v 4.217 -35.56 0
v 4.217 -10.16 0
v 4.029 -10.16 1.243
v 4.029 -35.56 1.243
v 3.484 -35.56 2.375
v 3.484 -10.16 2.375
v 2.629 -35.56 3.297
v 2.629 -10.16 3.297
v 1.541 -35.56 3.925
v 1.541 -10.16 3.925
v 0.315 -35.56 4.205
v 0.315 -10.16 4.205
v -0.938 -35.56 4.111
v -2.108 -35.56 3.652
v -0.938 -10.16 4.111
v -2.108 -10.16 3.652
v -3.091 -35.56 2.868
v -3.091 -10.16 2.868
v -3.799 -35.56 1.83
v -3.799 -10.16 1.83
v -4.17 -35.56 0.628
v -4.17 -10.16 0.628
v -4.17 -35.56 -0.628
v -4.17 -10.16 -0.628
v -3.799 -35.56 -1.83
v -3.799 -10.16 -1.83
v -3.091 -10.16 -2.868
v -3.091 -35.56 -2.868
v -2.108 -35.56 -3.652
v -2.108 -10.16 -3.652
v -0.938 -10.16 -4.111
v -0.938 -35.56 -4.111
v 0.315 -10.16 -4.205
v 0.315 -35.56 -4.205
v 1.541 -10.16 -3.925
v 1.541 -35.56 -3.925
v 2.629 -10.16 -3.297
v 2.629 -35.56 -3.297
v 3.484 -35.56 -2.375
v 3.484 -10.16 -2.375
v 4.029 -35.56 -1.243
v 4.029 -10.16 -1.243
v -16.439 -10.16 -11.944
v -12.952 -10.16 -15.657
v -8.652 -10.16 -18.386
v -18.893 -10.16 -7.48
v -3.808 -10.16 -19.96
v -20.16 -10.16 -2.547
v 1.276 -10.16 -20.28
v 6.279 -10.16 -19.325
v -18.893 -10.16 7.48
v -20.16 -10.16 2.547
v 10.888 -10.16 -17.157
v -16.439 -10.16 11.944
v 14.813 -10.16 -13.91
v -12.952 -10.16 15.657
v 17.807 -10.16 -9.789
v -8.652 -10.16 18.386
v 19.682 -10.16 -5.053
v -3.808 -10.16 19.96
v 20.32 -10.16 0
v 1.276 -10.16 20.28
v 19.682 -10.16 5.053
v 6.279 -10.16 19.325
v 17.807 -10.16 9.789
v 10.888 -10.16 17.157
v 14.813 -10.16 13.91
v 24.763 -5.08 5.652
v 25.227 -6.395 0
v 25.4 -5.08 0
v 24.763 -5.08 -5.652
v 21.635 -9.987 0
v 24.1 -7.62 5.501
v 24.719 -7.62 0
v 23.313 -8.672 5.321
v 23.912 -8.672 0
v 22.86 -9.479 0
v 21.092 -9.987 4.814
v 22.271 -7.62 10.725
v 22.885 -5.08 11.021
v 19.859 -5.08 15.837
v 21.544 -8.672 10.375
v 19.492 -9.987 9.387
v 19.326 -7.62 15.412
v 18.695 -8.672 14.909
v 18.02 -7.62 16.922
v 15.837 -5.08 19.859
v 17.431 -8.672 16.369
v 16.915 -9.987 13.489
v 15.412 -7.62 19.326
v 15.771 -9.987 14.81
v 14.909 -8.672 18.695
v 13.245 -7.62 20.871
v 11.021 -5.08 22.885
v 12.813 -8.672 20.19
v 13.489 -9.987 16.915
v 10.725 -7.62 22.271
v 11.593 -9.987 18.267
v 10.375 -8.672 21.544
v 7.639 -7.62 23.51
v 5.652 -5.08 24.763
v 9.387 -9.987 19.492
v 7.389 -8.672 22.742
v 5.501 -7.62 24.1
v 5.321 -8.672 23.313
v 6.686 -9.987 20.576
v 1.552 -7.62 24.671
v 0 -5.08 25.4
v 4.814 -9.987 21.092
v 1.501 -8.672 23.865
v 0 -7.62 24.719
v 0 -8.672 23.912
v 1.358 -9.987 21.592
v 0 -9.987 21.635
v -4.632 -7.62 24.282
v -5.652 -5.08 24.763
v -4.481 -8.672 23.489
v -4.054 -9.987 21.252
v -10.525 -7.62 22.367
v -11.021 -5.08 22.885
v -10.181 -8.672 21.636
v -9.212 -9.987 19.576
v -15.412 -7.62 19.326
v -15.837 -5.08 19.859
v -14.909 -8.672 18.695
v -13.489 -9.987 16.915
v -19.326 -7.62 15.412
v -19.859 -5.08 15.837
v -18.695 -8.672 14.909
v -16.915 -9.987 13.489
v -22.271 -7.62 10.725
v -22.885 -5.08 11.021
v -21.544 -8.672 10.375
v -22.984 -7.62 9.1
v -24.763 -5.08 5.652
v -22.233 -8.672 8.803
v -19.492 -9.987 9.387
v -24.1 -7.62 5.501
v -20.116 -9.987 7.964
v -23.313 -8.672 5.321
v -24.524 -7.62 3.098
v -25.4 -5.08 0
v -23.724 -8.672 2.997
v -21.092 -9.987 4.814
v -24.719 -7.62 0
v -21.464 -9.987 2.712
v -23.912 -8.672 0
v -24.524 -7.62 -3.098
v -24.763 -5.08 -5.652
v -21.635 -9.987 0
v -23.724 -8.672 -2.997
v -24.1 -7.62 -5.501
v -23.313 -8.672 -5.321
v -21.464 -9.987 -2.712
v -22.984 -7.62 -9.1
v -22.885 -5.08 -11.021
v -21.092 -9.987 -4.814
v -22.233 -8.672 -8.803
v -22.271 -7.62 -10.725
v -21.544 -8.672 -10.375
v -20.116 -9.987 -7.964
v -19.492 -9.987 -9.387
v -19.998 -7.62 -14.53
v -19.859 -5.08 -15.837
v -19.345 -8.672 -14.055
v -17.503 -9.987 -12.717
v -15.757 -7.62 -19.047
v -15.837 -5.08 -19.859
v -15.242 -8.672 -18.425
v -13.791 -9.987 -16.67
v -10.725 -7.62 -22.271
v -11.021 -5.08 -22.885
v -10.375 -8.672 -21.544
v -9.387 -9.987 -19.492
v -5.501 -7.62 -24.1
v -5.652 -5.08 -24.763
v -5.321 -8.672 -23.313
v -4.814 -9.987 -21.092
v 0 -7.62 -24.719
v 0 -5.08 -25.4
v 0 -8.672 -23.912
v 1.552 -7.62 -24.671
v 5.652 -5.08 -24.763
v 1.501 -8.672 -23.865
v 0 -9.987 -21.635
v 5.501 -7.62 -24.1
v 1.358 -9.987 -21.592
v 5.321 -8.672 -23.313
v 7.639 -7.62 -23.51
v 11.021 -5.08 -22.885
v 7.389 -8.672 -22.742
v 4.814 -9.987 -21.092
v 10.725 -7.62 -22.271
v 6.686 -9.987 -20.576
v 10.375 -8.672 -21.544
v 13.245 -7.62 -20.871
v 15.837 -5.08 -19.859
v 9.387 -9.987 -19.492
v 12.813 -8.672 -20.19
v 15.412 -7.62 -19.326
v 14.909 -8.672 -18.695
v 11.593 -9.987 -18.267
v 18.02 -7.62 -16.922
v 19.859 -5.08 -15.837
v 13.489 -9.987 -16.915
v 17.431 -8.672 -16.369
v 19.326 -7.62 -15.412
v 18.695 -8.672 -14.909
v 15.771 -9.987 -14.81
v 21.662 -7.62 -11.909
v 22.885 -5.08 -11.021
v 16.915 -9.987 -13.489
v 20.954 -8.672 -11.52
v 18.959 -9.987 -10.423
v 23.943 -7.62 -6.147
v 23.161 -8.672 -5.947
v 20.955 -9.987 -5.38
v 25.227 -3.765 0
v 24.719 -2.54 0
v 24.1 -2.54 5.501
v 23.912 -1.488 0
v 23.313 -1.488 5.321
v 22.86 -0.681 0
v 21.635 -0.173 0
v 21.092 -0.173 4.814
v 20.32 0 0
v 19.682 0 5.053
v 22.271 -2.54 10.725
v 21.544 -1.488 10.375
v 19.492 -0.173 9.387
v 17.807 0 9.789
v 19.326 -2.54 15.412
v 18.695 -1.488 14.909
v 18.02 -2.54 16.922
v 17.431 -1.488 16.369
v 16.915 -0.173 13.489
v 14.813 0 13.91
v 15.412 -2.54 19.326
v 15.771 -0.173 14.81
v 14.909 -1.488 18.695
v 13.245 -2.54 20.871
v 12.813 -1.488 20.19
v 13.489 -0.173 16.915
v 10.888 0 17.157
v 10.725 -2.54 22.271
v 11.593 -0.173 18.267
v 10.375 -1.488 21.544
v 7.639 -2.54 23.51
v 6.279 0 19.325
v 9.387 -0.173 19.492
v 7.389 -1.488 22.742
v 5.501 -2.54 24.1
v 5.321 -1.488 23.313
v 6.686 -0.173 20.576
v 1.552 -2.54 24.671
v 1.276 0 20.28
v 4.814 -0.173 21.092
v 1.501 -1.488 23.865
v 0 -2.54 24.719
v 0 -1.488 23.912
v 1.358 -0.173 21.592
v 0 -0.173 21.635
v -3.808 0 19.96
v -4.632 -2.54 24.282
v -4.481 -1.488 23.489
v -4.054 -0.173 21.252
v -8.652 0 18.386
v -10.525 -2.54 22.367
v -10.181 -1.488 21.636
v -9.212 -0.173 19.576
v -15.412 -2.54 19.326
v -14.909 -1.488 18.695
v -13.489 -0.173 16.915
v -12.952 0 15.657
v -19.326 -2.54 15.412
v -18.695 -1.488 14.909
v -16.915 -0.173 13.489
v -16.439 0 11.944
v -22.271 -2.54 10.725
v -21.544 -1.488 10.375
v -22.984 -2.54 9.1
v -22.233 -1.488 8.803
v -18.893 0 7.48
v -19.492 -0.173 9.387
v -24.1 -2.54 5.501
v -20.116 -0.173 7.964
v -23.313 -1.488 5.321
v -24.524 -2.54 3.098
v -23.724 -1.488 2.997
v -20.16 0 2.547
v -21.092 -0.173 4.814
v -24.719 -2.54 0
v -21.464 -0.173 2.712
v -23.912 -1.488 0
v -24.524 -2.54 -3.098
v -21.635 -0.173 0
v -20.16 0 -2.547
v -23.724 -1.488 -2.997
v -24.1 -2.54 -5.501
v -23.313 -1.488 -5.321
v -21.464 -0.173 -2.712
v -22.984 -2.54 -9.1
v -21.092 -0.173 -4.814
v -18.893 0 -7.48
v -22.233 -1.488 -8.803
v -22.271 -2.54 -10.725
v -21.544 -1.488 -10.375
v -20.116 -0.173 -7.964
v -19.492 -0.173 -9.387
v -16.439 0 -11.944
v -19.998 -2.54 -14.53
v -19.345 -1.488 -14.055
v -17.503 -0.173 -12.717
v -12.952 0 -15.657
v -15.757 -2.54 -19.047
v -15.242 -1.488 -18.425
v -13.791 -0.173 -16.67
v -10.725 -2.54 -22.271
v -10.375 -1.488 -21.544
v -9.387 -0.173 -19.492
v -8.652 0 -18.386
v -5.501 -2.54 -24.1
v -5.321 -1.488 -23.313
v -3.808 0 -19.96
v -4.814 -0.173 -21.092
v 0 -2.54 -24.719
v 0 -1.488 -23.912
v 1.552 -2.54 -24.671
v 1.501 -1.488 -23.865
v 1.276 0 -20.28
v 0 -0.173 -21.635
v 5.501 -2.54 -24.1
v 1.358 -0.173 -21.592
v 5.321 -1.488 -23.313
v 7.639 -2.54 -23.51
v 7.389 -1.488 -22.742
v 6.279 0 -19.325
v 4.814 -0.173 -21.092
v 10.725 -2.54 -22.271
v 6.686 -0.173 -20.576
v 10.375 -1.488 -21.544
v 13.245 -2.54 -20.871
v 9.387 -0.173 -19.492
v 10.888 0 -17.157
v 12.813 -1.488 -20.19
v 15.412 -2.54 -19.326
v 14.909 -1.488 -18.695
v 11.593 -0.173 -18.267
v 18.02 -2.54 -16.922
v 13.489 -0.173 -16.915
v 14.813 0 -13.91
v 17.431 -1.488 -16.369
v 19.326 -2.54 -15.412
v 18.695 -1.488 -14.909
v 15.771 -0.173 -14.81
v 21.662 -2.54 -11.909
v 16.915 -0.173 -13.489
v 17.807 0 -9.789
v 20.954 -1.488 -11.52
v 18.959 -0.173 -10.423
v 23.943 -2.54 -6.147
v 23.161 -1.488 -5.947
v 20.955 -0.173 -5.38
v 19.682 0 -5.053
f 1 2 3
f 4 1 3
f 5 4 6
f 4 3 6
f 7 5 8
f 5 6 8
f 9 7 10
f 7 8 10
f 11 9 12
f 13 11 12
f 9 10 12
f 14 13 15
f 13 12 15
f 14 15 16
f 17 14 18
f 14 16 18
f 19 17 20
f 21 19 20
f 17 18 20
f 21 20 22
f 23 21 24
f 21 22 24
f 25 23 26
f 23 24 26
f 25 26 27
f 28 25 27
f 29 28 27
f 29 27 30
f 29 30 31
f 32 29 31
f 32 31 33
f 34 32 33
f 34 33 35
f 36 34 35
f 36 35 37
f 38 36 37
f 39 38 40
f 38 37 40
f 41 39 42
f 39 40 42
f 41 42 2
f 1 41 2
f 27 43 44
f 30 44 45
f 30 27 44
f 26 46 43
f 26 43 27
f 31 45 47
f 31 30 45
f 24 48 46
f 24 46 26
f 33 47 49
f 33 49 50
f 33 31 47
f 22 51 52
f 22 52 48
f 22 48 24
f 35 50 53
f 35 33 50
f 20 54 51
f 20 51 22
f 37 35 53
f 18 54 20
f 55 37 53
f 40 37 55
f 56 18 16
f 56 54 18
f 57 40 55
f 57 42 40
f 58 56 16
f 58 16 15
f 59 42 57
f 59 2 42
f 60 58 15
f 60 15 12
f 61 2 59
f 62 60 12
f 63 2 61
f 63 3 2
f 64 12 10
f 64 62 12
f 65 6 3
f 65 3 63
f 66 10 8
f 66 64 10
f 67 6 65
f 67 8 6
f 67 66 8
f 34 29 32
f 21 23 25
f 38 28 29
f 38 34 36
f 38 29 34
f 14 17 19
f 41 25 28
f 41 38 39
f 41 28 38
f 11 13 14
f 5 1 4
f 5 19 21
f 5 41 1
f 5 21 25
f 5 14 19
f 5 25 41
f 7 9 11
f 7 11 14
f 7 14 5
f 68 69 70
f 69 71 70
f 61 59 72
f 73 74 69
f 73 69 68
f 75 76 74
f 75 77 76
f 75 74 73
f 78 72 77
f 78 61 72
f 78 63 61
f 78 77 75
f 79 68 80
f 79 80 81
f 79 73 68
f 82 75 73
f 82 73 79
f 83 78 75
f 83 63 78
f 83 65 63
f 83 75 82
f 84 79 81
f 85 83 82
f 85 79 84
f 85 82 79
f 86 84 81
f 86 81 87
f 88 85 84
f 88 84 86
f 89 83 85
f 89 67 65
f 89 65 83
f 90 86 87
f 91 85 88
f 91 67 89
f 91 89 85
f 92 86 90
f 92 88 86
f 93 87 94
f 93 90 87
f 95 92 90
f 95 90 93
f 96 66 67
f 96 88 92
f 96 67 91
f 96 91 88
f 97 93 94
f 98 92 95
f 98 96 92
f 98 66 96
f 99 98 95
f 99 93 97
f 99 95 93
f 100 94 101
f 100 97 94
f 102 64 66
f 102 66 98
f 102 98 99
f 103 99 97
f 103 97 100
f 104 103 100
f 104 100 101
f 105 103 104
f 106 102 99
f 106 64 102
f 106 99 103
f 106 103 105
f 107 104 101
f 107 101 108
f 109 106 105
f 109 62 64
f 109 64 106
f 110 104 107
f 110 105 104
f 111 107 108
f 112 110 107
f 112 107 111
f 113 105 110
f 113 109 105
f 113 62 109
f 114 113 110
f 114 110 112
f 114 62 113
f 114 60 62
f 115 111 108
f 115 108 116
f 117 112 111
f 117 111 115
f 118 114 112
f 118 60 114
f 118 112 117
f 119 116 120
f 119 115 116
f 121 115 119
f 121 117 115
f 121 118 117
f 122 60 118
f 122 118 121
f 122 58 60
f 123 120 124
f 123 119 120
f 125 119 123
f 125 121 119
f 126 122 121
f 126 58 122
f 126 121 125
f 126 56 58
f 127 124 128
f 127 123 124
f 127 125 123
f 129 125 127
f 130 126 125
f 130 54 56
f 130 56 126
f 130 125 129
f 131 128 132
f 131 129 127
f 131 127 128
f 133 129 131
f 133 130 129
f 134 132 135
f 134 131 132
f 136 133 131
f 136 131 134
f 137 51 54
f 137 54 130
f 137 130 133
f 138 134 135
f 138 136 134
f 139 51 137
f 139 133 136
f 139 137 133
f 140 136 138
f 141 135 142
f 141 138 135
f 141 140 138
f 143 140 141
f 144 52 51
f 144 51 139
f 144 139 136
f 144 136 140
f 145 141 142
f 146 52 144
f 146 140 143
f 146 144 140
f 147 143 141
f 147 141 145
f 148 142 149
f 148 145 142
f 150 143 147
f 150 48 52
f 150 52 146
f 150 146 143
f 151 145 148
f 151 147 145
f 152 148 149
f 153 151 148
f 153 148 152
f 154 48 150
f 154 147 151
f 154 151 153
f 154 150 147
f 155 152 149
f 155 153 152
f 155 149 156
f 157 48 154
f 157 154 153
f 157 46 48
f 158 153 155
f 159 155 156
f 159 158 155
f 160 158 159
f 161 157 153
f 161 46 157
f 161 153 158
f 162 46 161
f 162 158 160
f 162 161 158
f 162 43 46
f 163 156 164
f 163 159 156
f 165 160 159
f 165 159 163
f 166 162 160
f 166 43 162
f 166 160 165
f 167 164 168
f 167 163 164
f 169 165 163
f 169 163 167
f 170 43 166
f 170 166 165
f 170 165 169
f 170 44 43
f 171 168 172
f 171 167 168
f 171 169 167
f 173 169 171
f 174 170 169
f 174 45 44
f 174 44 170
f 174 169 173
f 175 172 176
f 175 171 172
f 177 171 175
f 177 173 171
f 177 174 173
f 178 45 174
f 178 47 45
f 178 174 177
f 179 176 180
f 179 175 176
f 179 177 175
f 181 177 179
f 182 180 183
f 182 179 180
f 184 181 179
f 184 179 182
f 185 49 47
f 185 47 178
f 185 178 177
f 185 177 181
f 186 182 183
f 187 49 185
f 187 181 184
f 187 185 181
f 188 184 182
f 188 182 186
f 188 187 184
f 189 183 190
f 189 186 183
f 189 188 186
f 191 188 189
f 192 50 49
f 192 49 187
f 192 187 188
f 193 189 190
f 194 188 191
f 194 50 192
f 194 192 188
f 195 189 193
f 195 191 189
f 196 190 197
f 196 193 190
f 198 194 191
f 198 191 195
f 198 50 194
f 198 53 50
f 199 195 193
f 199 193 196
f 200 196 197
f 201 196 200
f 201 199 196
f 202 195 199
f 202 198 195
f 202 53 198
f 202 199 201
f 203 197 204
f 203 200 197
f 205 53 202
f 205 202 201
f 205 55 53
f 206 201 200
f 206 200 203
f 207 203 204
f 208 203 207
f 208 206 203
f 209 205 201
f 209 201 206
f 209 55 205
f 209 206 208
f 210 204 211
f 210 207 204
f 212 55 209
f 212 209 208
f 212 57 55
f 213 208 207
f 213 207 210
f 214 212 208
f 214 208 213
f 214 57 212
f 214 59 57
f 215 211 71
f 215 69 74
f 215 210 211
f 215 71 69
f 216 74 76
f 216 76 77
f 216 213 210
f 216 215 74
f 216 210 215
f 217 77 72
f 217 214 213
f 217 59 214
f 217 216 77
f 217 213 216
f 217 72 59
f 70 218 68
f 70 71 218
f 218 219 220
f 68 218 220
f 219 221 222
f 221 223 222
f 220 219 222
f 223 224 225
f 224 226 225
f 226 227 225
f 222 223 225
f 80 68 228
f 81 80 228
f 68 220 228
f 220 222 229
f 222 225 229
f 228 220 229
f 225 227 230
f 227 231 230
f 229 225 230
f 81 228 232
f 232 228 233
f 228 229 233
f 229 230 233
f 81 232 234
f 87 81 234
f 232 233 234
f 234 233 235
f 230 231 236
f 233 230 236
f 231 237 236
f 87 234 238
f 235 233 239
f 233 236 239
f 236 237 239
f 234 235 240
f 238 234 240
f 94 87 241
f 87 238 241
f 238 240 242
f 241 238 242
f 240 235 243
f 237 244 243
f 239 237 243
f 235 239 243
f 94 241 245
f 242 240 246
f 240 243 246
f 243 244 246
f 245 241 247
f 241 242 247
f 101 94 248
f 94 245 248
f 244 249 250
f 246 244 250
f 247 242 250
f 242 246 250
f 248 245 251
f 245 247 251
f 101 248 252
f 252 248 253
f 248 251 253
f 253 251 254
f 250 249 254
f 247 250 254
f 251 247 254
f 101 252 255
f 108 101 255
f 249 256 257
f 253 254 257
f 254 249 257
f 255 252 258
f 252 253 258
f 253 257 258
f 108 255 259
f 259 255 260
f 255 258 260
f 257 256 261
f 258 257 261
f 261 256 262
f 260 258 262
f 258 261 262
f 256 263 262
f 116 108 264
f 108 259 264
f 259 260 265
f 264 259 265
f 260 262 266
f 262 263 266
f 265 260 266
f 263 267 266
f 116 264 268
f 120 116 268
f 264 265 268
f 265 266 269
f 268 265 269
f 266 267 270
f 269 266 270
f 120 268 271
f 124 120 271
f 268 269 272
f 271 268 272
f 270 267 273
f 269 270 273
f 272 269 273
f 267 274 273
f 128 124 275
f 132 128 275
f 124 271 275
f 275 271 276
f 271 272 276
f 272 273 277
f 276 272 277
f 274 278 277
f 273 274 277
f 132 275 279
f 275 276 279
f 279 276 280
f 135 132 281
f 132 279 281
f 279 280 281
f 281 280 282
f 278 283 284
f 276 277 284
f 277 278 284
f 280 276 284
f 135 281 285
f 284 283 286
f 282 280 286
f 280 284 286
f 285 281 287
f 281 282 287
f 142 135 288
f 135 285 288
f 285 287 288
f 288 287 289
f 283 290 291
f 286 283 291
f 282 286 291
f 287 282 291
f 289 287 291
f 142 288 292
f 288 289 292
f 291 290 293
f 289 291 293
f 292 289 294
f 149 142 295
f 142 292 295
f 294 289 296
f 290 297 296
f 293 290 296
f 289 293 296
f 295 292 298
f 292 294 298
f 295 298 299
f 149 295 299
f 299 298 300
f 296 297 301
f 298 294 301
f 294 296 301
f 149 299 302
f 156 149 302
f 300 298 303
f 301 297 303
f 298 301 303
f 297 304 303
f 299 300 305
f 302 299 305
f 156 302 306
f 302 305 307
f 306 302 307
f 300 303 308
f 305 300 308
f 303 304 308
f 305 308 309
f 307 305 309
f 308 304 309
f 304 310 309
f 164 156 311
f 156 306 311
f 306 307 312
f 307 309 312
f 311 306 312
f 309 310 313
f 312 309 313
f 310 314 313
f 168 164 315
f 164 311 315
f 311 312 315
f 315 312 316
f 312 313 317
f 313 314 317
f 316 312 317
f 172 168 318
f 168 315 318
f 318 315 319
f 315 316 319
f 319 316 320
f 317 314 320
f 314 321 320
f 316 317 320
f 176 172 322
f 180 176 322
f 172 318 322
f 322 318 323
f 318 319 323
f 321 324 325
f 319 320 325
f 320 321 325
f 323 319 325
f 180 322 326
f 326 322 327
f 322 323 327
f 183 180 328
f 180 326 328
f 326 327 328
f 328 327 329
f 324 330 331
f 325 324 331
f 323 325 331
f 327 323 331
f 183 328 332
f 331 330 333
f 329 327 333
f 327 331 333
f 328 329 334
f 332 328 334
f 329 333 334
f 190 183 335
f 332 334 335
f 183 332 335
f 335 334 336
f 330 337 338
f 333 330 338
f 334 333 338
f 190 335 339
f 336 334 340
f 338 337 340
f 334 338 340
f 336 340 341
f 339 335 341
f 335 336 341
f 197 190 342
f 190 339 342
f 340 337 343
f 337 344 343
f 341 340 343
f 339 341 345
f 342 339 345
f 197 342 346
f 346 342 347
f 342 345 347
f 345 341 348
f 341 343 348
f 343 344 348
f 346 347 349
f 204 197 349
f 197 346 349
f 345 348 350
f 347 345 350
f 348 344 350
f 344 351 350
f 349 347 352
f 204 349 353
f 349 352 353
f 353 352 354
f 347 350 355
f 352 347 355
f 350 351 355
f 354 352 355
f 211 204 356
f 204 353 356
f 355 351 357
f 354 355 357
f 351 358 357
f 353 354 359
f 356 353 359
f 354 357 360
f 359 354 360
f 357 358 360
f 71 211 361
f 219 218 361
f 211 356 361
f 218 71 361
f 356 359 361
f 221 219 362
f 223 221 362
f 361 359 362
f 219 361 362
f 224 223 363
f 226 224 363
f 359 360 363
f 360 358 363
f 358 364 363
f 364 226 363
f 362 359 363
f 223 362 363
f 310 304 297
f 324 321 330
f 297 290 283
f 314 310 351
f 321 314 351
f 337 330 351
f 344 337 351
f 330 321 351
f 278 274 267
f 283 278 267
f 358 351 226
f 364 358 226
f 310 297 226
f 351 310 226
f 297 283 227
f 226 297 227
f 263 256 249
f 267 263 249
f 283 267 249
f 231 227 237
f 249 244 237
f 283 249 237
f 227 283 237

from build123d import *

# Parameters (mm, degrees)
F0_R     = 25.4
F1_DEPTH = 10.16
F2_R     = 5.08
F3_R     = 5.07999
F4_R     = 4.2168312207
F5_DEPTH = 25.4


# Not quite as in the source:
# - a fillet or chamfer is up to 0.001 mm smaller than in the source, because OpenCascade refuses the exact size


with BuildPart() as f1:
    # F0 (on Front) → F1 (new body)
    with BuildSketch(Plane.XZ):
        Circle(F0_R)
    extrude(amount=F1_DEPTH)

    # F2
    f2_edges = [f1.edges().sort_by_distance(p)[0] for p in [
        (-25.4, -10.16, 0),
    ]]
    fillet(f2_edges, radius=F2_R)

    # F3 (radius 5.08 in the source; OpenCascade refuses exactly that, so slightly less here)
    f3_edges = [f1.edges().sort_by_distance(p)[0] for p in [
        (-25.4, 0, 0),
    ]]
    fillet(f3_edges, radius=F3_R)

    # F4 (on face) → F5 (join)
    with BuildSketch(Plane.XZ.offset(10.16)):
        Circle(F4_R)
    extrude(amount=F5_DEPTH)


solid = f1.part
